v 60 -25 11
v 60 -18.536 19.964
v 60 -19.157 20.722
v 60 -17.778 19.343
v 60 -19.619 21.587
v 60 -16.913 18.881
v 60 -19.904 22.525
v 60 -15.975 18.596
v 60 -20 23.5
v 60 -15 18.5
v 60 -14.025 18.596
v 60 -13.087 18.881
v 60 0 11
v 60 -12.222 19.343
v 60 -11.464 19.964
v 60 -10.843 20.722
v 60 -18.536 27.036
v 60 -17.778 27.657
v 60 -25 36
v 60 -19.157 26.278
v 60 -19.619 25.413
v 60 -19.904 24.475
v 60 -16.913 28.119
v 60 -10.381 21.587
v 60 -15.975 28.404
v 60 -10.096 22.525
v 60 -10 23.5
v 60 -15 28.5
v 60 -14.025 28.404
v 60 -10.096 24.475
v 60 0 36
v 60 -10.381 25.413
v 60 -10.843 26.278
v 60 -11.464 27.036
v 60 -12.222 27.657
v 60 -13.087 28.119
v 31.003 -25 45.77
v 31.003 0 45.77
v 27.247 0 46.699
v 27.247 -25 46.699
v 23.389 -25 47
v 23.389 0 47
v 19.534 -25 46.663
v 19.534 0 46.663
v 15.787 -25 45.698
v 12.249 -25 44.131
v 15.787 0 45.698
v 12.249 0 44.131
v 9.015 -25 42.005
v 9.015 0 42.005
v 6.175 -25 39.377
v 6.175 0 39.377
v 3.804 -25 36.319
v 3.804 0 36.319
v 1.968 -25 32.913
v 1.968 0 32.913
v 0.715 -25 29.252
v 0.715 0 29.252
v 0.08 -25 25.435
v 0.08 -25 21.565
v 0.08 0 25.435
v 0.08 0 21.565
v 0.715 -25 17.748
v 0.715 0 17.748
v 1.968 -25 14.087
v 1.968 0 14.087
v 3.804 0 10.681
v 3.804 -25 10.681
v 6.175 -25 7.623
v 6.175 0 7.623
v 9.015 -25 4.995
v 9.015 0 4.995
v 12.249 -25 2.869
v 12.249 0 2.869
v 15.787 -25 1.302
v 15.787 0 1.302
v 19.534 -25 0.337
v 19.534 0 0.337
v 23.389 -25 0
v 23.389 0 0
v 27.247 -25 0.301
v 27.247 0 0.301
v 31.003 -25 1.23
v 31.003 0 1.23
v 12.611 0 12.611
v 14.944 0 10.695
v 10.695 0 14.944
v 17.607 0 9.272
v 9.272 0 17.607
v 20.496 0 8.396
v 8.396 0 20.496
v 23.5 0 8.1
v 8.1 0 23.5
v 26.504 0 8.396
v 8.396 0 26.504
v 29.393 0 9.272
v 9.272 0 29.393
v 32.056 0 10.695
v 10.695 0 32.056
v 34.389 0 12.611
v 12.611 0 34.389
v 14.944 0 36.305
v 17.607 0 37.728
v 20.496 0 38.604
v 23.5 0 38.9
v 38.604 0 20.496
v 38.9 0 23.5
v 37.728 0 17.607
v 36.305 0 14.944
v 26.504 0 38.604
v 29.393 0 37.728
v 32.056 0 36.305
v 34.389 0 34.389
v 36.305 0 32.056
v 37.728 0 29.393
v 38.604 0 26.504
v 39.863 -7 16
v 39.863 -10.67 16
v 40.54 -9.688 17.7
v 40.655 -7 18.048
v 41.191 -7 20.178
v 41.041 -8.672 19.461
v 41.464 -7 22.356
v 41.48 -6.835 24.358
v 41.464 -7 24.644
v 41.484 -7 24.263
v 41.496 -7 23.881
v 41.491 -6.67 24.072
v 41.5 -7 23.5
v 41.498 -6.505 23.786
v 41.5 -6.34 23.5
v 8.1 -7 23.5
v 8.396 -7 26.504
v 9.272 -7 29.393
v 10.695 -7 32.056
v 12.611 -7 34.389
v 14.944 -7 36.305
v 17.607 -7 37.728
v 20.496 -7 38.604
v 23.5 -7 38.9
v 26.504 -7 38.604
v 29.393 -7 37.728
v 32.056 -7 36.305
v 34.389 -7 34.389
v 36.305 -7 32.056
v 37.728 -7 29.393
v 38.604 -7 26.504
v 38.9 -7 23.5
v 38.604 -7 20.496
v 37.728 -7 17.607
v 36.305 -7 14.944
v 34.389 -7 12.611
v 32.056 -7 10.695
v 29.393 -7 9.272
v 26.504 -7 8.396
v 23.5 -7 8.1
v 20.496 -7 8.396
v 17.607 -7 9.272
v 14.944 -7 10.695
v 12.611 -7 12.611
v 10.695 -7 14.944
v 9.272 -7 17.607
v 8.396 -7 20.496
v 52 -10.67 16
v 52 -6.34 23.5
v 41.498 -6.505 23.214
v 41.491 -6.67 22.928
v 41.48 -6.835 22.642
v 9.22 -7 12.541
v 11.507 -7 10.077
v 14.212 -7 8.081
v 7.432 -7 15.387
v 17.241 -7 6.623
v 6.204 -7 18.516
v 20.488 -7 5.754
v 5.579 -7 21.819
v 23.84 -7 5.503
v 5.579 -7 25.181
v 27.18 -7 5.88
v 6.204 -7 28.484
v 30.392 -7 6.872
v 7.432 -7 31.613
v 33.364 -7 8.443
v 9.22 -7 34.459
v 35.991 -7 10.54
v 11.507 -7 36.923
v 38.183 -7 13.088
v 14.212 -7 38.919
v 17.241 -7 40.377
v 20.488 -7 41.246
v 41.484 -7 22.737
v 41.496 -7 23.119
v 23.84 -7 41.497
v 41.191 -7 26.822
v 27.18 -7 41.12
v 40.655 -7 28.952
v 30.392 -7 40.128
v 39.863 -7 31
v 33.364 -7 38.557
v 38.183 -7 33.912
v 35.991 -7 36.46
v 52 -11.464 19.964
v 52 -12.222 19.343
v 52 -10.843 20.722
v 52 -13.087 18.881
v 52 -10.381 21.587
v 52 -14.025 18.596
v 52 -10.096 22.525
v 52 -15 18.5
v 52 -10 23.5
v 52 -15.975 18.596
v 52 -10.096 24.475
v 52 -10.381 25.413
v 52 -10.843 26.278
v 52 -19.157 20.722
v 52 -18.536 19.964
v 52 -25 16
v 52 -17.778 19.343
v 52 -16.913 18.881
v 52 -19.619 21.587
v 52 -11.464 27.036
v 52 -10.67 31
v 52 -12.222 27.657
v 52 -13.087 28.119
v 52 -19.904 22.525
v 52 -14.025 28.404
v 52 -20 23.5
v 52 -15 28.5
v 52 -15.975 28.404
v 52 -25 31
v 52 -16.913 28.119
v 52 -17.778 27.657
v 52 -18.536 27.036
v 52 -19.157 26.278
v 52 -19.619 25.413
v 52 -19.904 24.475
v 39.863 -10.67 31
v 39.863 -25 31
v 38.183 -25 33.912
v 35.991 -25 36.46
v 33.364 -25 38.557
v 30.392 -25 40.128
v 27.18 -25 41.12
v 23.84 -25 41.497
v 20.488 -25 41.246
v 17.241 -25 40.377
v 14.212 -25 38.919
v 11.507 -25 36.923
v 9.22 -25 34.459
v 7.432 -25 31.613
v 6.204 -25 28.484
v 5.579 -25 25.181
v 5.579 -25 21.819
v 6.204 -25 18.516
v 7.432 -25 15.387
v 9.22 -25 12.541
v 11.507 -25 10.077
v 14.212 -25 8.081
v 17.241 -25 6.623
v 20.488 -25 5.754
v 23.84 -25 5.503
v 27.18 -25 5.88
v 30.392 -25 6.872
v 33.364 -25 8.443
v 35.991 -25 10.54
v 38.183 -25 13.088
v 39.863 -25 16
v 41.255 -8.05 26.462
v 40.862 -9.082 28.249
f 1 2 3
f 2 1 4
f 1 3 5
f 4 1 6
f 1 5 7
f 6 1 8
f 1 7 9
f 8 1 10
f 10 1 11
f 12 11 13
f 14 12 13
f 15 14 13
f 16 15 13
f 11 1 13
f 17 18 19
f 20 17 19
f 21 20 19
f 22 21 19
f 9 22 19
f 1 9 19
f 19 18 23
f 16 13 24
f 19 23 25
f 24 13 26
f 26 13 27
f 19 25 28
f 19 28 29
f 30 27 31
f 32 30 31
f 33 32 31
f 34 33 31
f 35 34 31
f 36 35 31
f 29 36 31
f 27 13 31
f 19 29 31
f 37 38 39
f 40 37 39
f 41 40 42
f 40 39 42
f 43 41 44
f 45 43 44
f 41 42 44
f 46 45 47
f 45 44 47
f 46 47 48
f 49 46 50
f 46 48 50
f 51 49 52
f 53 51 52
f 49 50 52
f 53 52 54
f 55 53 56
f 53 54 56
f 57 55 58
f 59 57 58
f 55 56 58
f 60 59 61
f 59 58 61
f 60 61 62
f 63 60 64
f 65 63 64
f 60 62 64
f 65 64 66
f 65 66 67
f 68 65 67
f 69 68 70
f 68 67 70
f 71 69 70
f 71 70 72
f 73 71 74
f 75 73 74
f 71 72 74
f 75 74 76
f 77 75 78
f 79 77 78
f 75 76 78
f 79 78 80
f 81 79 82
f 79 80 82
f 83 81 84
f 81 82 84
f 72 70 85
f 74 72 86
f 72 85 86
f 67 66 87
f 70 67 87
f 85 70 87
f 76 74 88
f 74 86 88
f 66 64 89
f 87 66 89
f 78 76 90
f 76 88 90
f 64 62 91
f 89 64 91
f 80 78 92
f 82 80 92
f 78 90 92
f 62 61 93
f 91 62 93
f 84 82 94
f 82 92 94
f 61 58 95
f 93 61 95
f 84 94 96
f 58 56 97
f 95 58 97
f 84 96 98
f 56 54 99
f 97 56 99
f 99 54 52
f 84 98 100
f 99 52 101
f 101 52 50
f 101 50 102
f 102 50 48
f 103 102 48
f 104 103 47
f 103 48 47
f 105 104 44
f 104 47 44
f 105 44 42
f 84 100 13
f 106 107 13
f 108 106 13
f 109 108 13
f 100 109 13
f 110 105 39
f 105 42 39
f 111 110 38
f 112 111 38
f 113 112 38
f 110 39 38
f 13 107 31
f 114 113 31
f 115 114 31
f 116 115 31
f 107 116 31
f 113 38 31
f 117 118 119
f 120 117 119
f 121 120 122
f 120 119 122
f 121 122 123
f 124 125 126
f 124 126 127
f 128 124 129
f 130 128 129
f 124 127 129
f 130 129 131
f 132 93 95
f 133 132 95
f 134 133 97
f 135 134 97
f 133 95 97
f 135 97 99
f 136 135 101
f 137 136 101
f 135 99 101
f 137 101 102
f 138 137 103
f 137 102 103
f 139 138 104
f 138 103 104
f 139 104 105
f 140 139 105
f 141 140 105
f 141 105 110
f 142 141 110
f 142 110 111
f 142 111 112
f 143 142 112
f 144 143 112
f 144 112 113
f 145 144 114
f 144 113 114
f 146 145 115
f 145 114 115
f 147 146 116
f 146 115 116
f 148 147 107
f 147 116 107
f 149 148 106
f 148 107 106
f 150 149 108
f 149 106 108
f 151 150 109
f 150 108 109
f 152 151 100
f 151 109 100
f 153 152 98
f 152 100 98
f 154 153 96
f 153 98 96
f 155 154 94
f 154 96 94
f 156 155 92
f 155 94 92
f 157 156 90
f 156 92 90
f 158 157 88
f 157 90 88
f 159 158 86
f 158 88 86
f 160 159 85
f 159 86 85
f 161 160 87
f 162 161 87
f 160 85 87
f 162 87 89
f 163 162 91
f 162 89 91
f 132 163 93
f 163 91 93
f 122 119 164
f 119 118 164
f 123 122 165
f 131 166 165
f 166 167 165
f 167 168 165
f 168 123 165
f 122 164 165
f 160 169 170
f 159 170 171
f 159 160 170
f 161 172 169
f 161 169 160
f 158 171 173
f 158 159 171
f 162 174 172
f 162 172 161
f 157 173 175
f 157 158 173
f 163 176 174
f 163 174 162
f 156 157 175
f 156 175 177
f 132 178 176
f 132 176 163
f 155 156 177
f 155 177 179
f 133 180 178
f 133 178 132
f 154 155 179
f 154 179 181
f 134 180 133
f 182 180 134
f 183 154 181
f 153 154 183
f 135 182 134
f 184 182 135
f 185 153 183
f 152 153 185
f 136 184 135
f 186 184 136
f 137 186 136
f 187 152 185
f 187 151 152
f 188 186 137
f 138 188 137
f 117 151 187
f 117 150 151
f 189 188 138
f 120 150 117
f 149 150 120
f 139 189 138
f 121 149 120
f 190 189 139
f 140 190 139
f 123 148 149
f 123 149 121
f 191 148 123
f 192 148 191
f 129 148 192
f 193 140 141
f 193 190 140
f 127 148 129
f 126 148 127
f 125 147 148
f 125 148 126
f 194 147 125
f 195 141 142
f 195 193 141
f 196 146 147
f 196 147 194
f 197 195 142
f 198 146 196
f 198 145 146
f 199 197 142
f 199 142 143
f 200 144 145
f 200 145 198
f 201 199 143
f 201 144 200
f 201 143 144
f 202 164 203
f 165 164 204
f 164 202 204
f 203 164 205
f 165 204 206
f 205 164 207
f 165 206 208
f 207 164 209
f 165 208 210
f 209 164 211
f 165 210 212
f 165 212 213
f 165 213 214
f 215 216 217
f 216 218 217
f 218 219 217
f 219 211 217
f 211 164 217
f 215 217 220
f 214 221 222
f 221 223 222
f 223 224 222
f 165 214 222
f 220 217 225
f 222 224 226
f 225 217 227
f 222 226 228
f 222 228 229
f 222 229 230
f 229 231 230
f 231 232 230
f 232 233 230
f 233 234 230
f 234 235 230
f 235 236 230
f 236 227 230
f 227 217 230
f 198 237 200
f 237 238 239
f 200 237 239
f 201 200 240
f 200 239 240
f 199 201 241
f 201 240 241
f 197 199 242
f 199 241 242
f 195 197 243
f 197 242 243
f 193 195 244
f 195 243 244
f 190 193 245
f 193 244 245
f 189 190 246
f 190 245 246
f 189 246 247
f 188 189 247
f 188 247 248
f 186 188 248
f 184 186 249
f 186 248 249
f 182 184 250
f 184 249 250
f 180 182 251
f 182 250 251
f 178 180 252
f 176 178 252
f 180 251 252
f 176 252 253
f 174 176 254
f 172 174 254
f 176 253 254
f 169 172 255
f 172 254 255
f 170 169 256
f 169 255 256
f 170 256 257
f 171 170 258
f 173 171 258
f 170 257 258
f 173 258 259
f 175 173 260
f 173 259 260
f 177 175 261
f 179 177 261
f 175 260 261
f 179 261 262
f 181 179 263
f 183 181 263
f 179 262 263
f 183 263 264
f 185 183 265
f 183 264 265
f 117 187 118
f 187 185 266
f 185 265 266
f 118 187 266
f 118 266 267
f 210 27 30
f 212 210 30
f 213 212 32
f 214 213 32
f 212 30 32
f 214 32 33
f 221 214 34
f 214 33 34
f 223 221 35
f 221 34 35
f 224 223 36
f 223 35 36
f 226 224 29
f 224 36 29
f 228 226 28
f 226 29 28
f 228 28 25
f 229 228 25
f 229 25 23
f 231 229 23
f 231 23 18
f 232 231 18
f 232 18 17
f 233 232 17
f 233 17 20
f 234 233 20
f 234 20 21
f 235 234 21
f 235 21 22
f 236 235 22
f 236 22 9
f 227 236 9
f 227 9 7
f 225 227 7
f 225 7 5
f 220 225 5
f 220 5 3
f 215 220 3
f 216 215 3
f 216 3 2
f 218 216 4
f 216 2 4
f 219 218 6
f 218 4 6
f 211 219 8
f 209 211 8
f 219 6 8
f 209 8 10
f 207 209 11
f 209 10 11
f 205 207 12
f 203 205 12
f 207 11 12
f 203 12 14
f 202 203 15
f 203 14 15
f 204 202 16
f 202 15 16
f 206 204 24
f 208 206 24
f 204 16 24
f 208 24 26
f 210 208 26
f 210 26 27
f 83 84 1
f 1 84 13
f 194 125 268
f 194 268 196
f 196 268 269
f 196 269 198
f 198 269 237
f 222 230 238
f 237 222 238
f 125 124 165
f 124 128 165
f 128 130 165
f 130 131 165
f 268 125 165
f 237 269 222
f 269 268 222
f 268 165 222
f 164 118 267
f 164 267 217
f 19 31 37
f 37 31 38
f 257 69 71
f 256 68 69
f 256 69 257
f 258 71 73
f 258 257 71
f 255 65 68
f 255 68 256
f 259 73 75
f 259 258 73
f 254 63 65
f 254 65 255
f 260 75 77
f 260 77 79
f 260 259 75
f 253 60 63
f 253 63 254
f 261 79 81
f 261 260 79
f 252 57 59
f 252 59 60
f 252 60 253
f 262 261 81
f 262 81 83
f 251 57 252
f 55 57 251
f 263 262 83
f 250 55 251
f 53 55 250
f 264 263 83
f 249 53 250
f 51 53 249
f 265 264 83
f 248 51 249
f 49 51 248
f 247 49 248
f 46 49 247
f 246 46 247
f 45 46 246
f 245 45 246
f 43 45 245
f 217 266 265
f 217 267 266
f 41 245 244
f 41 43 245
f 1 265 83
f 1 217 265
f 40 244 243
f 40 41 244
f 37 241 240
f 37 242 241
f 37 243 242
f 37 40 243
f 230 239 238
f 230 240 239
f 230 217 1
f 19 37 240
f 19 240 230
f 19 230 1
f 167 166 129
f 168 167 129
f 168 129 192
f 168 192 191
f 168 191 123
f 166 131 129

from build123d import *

# Parameters (mm, degrees)
F1_DEPTH       = 25
F2_R           = 18
F3_DEPTH       = 18
F4_R           = 15.4
F5_DEPTH       = 7
F6_R           = 5
F7_DEPTH       = 25
F9_DEPTH       = 22
F11_END_RADIUS = 18
F11_REACH      = 68.8481644957


with BuildPart() as f1:
    # F0 (on Front) → F1 (new body)
    with BuildSketch(Plane.XZ):
        with BuildLine():
            Line((60, 11), (60, 23.5))
            Line((60, 23.5), (60, 36))
            Line((60, 36), (31.0034618727, 45.7698913317))
            ThreePointArc((31.0034618727, 45.7698913317), (0, 23.5), (31.0034618727, 1.2301086683))
            Line((31.0034618727, 1.2301086683), (60, 11))
        make_face()
    extrude(amount=F1_DEPTH)

    # F2 (on face) → F3 (cut)
    with BuildSketch(Plane.XZ.offset(25)):
        with Locations((23.5, 23.5)):
            Circle(F2_R)
    extrude(amount=-F3_DEPTH, mode=Mode.SUBTRACT)

    # F4 (on face) → F5 (cut)
    with BuildSketch(Plane(origin=(0, 0, 0), x_dir=(-1, 0, 0), z_dir=(0, 1, 0))):
        with Locations((-23.5, 23.5)):
            Circle(F4_R)
    extrude(amount=-F5_DEPTH, mode=Mode.SUBTRACT)

    # F6 (on face) → F7 (cut)
    with BuildSketch(Plane.YZ.offset(60)):
        with Locations((-15, 23.5)):
            Circle(F6_R)
    extrude(amount=-F7_DEPTH, mode=Mode.SUBTRACT)

    # F8 (on face) → F9 (cut)
    with BuildSketch(Plane.XZ.offset(25)):
        with BuildLine():
            Line((52, 16), (52, 23.5))
            Line((52, 23.5), (52, 31))
            Line((52, 31), (39.863068172, 31))
            ThreePointArc((39.863068172, 31), (41.0860061852, 27.3382791004), (41.5, 23.5))
            ThreePointArc((41.5, 23.5), (41.0860061852, 19.6617208996), (39.863068172, 16))
            Line((39.863068172, 16), (52, 16))
        make_face()
    extrude(amount=-F9_DEPTH, mode=Mode.SUBTRACT)

    f11_end = (Plane(origin=(23.5, -5, 23.5), x_dir=(0, 0, -1), z_dir=(0, -1, 0)) * Cylinder(F11_END_RADIUS, 298.1207660327, mode=Mode.PRIVATE)).faces().sort_by_distance((41.5, -5, 23.5))[0]
    # F10 (on face) → F11 (join, up to the whole of a round face its end follows)
    with BuildSketch(Plane(origin=(52, 0, 0), x_dir=(0, -1, 0), z_dir=(-1, 0, 0))):
        Polygon((3, 16), (10.6698729811, 16), (6.3397459622, 23.5), (10.6698729811, 31), (3, 31), align=None)
    f11_long = extrude(amount=F11_REACH, mode=Mode.PRIVATE)
    add(split(f11_long, bisect_by=f11_end, keep=Keep.ALL, mode=Mode.PRIVATE).solids().sort_by_distance((52, -5.8943260873, 23.5))[0])


solid = f1.part
